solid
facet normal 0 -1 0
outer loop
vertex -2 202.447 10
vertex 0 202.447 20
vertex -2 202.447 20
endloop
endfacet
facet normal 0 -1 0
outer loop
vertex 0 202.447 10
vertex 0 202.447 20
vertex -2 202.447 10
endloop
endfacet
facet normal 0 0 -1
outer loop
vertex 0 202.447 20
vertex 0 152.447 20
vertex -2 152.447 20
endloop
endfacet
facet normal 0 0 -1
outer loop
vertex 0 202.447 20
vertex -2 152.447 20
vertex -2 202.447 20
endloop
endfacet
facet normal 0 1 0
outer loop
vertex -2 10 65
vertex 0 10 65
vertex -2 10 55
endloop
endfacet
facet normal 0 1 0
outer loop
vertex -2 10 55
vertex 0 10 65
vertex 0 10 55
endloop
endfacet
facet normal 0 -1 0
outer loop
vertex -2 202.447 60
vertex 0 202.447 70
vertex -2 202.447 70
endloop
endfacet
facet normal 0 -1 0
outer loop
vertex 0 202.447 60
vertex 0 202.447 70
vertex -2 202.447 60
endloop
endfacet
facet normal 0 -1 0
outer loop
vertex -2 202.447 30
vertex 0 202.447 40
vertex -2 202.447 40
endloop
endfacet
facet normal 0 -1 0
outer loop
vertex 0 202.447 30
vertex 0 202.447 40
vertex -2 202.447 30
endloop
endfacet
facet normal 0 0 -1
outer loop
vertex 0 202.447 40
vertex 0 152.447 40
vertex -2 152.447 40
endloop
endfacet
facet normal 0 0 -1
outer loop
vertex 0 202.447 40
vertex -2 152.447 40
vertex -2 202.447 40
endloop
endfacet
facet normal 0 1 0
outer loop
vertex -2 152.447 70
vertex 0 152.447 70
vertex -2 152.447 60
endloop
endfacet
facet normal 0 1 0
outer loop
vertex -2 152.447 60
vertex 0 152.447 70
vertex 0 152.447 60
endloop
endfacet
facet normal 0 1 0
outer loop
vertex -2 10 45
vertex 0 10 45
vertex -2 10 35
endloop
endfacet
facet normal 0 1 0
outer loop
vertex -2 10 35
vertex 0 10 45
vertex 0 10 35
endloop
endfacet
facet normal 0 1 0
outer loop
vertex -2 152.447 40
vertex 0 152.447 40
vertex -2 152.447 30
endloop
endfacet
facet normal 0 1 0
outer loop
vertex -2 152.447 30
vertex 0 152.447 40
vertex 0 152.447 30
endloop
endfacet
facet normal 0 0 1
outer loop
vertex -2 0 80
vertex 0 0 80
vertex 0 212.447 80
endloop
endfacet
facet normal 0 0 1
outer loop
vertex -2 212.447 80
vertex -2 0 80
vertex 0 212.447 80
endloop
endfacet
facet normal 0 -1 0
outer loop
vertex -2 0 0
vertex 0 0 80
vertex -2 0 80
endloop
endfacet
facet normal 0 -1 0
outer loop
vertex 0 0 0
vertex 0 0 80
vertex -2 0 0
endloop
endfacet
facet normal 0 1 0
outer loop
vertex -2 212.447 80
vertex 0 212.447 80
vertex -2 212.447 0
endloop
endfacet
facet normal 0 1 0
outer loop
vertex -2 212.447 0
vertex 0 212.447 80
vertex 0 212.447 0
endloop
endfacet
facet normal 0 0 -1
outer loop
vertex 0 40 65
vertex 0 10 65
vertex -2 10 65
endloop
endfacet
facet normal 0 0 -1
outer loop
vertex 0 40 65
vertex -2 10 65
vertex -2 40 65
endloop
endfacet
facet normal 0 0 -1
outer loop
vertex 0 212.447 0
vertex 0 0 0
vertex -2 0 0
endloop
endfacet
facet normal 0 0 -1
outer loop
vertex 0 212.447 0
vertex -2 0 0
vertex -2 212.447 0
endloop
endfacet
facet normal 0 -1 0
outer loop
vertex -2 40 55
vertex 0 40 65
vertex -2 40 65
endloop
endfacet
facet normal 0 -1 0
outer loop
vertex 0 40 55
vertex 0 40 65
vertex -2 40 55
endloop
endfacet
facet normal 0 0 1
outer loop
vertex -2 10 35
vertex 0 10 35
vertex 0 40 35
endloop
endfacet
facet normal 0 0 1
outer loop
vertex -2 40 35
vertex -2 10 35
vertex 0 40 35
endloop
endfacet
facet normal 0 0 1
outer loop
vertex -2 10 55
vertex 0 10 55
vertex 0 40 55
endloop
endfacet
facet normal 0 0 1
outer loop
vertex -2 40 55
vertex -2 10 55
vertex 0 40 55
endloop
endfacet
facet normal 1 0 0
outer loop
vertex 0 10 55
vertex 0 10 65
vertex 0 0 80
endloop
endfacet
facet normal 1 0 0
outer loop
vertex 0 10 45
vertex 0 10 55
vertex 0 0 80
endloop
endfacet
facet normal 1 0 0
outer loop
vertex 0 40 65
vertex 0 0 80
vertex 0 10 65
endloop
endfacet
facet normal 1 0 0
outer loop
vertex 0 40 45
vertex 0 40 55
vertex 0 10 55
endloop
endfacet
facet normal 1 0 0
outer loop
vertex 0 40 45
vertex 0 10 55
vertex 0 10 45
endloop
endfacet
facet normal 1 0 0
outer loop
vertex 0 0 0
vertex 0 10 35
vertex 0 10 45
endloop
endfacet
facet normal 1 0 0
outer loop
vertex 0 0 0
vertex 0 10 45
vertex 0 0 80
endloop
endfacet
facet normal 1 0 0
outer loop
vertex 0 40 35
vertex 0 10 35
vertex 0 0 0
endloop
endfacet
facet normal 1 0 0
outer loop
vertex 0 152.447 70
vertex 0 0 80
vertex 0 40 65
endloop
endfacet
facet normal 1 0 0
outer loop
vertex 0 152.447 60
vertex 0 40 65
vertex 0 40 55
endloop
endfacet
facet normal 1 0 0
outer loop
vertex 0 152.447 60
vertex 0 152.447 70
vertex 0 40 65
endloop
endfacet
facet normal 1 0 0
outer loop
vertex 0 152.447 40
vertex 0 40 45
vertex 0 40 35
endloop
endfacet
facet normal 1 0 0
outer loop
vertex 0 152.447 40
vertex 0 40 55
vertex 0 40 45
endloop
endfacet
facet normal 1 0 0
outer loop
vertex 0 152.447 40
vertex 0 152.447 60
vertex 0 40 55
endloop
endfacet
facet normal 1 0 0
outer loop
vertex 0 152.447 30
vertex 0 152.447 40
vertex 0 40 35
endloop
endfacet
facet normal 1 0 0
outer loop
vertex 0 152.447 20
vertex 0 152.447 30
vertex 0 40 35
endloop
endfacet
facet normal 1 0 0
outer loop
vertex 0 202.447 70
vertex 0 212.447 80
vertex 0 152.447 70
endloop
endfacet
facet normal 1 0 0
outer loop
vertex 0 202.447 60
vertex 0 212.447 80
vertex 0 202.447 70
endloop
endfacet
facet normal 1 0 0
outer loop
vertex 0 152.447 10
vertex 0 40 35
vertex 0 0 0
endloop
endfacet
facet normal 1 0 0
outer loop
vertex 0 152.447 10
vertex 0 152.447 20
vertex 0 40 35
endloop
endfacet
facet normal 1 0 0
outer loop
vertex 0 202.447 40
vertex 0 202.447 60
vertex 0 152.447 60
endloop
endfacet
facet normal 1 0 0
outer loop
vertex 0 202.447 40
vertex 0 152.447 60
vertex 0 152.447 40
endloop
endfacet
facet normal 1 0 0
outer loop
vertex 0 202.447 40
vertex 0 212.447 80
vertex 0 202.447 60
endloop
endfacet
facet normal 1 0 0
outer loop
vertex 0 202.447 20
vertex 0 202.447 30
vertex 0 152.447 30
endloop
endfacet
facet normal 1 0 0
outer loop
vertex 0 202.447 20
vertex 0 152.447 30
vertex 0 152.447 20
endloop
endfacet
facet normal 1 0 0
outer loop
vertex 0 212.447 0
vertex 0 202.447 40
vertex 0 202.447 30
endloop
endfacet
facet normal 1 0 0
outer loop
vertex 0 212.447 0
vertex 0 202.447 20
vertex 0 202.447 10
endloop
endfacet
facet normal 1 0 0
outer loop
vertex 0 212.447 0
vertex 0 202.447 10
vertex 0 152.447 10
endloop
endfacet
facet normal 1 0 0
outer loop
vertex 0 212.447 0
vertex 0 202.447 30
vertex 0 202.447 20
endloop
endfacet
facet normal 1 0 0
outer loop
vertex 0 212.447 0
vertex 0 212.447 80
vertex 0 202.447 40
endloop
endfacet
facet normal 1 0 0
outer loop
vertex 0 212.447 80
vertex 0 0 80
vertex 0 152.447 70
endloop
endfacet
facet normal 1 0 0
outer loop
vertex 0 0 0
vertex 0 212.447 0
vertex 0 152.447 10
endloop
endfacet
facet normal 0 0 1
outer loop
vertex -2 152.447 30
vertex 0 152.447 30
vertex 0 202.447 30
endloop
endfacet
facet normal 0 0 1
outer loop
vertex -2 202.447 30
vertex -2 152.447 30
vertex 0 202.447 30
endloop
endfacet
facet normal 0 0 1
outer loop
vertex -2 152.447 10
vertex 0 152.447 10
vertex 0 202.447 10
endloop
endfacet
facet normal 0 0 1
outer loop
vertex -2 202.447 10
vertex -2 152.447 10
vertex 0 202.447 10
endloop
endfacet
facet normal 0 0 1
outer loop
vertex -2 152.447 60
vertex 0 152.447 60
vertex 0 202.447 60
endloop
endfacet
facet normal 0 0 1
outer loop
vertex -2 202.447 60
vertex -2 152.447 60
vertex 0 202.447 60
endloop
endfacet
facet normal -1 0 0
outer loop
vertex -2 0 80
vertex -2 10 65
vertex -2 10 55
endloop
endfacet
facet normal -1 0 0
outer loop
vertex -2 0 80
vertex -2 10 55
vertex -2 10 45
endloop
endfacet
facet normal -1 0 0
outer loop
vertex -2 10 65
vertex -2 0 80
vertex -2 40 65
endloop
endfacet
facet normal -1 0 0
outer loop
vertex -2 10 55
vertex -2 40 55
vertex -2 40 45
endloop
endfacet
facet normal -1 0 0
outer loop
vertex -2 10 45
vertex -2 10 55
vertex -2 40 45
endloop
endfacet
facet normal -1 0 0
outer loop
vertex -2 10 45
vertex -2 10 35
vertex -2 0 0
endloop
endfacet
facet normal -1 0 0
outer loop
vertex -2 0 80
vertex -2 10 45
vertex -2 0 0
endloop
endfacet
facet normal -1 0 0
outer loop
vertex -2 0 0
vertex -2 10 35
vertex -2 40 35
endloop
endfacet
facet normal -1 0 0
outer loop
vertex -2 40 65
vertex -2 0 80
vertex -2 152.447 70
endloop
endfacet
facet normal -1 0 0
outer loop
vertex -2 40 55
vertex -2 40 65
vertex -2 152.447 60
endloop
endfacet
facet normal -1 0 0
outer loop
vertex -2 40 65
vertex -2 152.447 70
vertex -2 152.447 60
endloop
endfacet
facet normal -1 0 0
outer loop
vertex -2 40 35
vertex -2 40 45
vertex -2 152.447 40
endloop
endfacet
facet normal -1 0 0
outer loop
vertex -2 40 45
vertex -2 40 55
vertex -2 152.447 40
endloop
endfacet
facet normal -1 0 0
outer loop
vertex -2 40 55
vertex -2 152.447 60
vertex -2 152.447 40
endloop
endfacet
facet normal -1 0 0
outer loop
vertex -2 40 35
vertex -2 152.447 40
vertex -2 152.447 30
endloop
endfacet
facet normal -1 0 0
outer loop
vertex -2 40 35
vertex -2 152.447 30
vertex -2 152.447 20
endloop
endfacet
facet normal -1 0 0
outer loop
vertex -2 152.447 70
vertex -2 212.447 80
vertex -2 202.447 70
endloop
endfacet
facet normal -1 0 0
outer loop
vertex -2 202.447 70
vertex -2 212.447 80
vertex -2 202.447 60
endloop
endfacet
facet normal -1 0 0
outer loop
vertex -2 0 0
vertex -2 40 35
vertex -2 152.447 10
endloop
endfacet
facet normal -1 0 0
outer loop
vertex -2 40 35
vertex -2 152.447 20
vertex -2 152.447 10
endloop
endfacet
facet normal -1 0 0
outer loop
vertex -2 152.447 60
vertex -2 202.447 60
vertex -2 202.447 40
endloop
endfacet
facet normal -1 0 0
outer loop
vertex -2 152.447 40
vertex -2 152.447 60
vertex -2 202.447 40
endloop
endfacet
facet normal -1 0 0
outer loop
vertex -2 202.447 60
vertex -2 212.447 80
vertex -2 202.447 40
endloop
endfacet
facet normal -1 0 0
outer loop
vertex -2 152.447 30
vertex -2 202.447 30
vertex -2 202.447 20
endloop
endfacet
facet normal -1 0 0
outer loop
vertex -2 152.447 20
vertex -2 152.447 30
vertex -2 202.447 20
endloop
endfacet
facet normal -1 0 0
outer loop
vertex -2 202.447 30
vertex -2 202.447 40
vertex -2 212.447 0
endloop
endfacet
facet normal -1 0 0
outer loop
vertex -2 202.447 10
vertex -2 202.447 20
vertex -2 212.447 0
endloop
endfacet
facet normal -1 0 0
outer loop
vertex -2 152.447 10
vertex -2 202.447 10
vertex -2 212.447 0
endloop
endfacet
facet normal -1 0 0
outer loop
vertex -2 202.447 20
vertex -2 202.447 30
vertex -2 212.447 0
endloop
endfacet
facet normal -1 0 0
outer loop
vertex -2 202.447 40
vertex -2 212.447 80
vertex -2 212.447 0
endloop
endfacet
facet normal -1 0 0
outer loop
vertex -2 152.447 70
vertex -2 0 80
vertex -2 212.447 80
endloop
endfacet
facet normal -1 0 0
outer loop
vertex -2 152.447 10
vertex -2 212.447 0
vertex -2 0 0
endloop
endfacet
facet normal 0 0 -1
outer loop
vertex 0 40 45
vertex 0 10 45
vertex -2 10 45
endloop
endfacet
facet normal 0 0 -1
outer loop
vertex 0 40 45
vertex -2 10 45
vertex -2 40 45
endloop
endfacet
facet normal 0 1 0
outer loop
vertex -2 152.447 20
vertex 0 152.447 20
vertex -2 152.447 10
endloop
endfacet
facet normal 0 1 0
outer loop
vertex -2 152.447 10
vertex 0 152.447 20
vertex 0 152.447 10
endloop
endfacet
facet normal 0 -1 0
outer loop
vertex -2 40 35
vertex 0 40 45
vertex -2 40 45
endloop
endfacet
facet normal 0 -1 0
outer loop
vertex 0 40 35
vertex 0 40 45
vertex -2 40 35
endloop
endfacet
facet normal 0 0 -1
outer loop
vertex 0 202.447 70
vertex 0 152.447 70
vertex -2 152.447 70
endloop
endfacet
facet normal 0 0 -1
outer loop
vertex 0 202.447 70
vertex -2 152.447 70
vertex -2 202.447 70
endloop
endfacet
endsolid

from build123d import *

# Parameters (mm, degrees)
SKETCH1_W          = 80
SKETCH1_H          = 212.4467896
SKETCH1_W_2        = 10
SKETCH1_H_2        = 50
SKETCH1_H_3        = 30
BASE_FLANGE1_DEPTH = 2


# Sheet-metal steps are written as plain solids
with BuildPart() as part:
    # Sketch1 → Base-Flange1 (new body)
    with BuildSketch(Plane(origin=(0, 0, 0), x_dir=(0, 0, -1), z_dir=(1, 0, 0))):
        with Locations((-40, 106.2233948)):
            Rectangle(SKETCH1_W, SKETCH1_H)
        with Locations((-65, 177.4467896)):
            Rectangle(SKETCH1_W_2, SKETCH1_H_2, mode=Mode.SUBTRACT)
        with Locations((-35, 177.4467896)):
            Rectangle(SKETCH1_W_2, SKETCH1_H_2, mode=Mode.SUBTRACT)
        with Locations((-15, 177.4467896)):
            Rectangle(SKETCH1_W_2, SKETCH1_H_2, mode=Mode.SUBTRACT)
        with Locations((-60, 25)):
            Rectangle(SKETCH1_W_2, SKETCH1_H_3, mode=Mode.SUBTRACT)
        with Locations((-40, 25)):
            Rectangle(SKETCH1_W_2, SKETCH1_H_3, mode=Mode.SUBTRACT)
    extrude(amount=-BASE_FLANGE1_DEPTH)


solid = part.part
